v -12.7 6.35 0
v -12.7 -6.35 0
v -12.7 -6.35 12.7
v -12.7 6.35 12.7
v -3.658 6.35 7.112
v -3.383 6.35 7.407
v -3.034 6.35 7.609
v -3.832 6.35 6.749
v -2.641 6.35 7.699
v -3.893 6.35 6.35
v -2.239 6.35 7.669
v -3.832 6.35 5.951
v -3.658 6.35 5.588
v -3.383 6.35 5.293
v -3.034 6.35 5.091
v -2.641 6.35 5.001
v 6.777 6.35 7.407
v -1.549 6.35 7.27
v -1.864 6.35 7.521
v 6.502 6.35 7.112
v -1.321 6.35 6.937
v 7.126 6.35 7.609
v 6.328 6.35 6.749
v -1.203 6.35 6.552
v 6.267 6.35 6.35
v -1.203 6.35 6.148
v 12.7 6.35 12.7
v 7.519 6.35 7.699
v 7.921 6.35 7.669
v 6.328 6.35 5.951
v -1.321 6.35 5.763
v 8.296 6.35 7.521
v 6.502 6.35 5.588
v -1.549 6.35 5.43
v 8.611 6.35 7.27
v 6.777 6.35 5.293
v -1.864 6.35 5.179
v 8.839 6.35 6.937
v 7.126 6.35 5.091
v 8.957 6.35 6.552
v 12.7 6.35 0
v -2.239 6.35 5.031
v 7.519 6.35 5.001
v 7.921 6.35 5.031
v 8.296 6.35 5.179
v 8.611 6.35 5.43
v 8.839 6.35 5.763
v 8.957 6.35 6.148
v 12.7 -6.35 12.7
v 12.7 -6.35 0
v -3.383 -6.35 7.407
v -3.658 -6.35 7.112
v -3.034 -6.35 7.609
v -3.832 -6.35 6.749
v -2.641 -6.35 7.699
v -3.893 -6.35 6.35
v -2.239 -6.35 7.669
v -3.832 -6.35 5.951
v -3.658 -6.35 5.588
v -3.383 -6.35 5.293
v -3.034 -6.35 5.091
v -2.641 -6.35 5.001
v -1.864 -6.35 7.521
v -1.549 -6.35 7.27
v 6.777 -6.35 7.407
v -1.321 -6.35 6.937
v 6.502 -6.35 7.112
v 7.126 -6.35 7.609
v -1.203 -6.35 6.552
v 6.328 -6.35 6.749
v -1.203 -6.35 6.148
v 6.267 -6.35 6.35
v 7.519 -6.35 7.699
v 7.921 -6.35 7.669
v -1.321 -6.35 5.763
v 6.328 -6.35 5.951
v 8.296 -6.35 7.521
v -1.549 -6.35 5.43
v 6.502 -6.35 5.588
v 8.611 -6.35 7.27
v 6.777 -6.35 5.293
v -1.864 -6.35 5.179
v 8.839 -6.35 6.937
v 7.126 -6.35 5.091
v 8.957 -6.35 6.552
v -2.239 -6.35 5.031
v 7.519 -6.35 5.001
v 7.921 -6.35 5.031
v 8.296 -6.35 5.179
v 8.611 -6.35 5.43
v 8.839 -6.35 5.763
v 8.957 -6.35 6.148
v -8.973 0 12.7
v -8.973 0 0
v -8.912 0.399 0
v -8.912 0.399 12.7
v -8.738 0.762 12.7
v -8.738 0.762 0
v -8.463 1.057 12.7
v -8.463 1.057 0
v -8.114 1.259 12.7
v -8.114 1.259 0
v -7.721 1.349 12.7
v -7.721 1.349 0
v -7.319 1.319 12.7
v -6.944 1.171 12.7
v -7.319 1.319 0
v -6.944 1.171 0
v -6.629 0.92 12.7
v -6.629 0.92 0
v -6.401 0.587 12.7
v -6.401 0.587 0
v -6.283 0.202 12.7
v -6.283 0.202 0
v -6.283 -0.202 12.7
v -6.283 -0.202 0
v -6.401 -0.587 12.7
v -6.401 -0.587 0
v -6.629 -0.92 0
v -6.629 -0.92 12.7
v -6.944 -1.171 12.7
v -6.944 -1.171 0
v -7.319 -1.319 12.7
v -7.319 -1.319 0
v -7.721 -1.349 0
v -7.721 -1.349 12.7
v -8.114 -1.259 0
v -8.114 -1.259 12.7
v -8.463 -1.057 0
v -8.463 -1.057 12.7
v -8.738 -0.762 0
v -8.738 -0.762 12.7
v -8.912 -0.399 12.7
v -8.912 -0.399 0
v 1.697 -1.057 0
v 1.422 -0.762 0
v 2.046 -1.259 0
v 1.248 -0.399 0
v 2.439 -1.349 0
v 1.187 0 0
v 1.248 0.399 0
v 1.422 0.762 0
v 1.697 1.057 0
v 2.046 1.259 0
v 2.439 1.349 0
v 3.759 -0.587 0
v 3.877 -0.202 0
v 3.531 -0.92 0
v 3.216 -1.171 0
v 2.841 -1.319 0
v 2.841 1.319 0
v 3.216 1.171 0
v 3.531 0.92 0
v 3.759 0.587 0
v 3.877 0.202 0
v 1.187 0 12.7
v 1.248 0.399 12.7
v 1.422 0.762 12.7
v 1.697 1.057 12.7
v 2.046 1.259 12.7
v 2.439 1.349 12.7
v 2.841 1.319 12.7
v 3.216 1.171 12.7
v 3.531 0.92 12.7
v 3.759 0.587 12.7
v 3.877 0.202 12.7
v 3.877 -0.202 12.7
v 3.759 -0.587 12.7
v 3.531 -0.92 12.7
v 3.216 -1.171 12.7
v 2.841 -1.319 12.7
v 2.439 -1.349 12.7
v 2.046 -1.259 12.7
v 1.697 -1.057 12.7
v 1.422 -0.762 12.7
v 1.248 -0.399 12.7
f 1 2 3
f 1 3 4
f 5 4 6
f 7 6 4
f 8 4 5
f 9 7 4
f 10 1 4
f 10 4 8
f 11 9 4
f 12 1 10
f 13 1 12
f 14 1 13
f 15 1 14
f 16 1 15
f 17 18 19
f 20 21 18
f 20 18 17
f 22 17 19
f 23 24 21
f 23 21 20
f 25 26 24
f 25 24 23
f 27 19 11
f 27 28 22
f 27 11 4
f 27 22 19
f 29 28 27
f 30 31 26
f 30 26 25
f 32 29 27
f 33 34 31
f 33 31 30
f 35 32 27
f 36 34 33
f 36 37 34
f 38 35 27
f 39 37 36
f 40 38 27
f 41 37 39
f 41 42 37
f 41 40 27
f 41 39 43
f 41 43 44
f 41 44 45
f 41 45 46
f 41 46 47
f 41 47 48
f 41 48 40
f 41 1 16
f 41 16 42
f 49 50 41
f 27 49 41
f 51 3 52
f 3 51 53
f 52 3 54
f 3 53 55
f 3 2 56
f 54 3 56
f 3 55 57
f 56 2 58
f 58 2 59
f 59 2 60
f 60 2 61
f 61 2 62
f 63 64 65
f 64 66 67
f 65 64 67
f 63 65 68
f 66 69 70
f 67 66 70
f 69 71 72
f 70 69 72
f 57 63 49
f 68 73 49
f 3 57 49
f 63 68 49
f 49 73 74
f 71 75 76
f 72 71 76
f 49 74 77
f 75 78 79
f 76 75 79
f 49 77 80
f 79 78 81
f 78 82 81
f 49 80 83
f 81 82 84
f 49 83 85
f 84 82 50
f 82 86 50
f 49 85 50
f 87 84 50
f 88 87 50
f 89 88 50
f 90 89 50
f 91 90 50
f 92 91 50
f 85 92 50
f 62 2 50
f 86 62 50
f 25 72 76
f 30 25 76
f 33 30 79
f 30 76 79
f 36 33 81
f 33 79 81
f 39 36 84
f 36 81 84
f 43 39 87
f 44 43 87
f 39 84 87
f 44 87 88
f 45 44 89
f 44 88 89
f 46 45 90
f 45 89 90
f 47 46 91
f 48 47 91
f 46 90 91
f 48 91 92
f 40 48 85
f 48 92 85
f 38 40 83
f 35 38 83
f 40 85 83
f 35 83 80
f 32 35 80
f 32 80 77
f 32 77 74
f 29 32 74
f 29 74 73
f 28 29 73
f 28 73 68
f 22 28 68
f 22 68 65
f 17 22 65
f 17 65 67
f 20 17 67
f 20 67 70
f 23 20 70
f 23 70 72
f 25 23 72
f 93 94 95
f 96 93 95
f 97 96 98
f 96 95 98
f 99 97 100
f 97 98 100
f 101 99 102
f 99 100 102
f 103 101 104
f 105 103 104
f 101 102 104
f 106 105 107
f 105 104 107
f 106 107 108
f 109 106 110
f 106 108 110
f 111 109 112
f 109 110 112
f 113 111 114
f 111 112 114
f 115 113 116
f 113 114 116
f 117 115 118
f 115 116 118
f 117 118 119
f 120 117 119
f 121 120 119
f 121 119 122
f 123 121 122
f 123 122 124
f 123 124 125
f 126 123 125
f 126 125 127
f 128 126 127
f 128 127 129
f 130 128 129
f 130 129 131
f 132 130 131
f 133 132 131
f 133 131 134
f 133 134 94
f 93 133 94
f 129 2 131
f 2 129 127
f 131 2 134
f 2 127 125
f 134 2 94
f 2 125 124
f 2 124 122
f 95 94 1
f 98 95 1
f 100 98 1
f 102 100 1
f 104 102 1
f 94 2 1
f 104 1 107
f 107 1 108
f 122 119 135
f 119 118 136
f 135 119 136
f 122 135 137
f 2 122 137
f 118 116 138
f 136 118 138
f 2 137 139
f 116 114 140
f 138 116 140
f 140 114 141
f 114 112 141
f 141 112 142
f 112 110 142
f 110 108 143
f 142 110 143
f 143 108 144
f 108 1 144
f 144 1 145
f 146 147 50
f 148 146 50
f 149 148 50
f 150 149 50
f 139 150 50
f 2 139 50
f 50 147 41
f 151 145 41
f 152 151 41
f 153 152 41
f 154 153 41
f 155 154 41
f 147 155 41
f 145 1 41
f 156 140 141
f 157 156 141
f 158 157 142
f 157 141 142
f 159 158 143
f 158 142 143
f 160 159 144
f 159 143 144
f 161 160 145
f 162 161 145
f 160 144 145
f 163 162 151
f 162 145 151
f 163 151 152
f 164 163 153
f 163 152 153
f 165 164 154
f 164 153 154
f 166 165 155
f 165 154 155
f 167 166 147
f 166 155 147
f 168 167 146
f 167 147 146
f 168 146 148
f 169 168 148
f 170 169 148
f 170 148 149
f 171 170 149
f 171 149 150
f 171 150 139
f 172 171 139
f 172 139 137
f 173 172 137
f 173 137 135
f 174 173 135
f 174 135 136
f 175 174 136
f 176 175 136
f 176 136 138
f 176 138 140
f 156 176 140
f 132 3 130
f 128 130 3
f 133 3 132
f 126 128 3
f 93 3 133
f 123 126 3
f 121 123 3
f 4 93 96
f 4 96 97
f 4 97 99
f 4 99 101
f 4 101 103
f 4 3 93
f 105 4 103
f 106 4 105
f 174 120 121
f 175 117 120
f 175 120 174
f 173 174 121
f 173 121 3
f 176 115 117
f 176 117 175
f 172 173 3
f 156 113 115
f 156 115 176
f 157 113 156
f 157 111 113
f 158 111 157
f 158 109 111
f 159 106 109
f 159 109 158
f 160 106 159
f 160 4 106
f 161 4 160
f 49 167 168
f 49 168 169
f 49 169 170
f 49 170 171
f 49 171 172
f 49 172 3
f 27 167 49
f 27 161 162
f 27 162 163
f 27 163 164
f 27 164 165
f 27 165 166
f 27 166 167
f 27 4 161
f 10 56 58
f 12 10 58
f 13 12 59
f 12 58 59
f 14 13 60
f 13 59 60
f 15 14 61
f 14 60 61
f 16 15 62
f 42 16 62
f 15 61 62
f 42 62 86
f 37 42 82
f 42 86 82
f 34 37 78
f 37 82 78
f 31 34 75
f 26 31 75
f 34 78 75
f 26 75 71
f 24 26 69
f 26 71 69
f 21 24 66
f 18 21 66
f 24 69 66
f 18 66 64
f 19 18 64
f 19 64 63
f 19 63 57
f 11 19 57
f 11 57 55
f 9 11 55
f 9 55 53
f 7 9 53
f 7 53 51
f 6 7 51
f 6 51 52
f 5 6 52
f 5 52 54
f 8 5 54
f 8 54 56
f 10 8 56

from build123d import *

# Parameters (mm, degrees)
SKETCH1_W                 = 25.4
SKETCH1_H                 = 12.7
BOSS_EXTRUDE1_DEPTH       = 12.7
TAP_DRILL_FOR_6_32_TAP1_D = 2.7051
TAP_DRILL_FOR_6_32_TAP2_D = 2.7051


with BuildPart() as part:
    # Sketch1 → Boss-Extrude1 (new body)
    with BuildSketch(Plane.XY):
        Rectangle(SKETCH1_W, SKETCH1_H)
    extrude(amount=BOSS_EXTRUDE1_DEPTH)

    # Tap Drill for #6-32 Tap1 (through all)
    with Locations(Plane(origin=(0, 6.35, 0), x_dir=(1, 0, 0), z_dir=(0, 1, 0))):
        with Locations((-2.54, -6.35), (7.62, -6.35)):
            Hole(TAP_DRILL_FOR_6_32_TAP1_D / 2)

    # Tap Drill for #6-32 Tap2 (through all)
    with Locations(Plane.XY.offset(12.7)):
        with Locations((-7.62, 0), (2.54, 0)):
            Hole(TAP_DRILL_FOR_6_32_TAP2_D / 2)


solid = part.part
